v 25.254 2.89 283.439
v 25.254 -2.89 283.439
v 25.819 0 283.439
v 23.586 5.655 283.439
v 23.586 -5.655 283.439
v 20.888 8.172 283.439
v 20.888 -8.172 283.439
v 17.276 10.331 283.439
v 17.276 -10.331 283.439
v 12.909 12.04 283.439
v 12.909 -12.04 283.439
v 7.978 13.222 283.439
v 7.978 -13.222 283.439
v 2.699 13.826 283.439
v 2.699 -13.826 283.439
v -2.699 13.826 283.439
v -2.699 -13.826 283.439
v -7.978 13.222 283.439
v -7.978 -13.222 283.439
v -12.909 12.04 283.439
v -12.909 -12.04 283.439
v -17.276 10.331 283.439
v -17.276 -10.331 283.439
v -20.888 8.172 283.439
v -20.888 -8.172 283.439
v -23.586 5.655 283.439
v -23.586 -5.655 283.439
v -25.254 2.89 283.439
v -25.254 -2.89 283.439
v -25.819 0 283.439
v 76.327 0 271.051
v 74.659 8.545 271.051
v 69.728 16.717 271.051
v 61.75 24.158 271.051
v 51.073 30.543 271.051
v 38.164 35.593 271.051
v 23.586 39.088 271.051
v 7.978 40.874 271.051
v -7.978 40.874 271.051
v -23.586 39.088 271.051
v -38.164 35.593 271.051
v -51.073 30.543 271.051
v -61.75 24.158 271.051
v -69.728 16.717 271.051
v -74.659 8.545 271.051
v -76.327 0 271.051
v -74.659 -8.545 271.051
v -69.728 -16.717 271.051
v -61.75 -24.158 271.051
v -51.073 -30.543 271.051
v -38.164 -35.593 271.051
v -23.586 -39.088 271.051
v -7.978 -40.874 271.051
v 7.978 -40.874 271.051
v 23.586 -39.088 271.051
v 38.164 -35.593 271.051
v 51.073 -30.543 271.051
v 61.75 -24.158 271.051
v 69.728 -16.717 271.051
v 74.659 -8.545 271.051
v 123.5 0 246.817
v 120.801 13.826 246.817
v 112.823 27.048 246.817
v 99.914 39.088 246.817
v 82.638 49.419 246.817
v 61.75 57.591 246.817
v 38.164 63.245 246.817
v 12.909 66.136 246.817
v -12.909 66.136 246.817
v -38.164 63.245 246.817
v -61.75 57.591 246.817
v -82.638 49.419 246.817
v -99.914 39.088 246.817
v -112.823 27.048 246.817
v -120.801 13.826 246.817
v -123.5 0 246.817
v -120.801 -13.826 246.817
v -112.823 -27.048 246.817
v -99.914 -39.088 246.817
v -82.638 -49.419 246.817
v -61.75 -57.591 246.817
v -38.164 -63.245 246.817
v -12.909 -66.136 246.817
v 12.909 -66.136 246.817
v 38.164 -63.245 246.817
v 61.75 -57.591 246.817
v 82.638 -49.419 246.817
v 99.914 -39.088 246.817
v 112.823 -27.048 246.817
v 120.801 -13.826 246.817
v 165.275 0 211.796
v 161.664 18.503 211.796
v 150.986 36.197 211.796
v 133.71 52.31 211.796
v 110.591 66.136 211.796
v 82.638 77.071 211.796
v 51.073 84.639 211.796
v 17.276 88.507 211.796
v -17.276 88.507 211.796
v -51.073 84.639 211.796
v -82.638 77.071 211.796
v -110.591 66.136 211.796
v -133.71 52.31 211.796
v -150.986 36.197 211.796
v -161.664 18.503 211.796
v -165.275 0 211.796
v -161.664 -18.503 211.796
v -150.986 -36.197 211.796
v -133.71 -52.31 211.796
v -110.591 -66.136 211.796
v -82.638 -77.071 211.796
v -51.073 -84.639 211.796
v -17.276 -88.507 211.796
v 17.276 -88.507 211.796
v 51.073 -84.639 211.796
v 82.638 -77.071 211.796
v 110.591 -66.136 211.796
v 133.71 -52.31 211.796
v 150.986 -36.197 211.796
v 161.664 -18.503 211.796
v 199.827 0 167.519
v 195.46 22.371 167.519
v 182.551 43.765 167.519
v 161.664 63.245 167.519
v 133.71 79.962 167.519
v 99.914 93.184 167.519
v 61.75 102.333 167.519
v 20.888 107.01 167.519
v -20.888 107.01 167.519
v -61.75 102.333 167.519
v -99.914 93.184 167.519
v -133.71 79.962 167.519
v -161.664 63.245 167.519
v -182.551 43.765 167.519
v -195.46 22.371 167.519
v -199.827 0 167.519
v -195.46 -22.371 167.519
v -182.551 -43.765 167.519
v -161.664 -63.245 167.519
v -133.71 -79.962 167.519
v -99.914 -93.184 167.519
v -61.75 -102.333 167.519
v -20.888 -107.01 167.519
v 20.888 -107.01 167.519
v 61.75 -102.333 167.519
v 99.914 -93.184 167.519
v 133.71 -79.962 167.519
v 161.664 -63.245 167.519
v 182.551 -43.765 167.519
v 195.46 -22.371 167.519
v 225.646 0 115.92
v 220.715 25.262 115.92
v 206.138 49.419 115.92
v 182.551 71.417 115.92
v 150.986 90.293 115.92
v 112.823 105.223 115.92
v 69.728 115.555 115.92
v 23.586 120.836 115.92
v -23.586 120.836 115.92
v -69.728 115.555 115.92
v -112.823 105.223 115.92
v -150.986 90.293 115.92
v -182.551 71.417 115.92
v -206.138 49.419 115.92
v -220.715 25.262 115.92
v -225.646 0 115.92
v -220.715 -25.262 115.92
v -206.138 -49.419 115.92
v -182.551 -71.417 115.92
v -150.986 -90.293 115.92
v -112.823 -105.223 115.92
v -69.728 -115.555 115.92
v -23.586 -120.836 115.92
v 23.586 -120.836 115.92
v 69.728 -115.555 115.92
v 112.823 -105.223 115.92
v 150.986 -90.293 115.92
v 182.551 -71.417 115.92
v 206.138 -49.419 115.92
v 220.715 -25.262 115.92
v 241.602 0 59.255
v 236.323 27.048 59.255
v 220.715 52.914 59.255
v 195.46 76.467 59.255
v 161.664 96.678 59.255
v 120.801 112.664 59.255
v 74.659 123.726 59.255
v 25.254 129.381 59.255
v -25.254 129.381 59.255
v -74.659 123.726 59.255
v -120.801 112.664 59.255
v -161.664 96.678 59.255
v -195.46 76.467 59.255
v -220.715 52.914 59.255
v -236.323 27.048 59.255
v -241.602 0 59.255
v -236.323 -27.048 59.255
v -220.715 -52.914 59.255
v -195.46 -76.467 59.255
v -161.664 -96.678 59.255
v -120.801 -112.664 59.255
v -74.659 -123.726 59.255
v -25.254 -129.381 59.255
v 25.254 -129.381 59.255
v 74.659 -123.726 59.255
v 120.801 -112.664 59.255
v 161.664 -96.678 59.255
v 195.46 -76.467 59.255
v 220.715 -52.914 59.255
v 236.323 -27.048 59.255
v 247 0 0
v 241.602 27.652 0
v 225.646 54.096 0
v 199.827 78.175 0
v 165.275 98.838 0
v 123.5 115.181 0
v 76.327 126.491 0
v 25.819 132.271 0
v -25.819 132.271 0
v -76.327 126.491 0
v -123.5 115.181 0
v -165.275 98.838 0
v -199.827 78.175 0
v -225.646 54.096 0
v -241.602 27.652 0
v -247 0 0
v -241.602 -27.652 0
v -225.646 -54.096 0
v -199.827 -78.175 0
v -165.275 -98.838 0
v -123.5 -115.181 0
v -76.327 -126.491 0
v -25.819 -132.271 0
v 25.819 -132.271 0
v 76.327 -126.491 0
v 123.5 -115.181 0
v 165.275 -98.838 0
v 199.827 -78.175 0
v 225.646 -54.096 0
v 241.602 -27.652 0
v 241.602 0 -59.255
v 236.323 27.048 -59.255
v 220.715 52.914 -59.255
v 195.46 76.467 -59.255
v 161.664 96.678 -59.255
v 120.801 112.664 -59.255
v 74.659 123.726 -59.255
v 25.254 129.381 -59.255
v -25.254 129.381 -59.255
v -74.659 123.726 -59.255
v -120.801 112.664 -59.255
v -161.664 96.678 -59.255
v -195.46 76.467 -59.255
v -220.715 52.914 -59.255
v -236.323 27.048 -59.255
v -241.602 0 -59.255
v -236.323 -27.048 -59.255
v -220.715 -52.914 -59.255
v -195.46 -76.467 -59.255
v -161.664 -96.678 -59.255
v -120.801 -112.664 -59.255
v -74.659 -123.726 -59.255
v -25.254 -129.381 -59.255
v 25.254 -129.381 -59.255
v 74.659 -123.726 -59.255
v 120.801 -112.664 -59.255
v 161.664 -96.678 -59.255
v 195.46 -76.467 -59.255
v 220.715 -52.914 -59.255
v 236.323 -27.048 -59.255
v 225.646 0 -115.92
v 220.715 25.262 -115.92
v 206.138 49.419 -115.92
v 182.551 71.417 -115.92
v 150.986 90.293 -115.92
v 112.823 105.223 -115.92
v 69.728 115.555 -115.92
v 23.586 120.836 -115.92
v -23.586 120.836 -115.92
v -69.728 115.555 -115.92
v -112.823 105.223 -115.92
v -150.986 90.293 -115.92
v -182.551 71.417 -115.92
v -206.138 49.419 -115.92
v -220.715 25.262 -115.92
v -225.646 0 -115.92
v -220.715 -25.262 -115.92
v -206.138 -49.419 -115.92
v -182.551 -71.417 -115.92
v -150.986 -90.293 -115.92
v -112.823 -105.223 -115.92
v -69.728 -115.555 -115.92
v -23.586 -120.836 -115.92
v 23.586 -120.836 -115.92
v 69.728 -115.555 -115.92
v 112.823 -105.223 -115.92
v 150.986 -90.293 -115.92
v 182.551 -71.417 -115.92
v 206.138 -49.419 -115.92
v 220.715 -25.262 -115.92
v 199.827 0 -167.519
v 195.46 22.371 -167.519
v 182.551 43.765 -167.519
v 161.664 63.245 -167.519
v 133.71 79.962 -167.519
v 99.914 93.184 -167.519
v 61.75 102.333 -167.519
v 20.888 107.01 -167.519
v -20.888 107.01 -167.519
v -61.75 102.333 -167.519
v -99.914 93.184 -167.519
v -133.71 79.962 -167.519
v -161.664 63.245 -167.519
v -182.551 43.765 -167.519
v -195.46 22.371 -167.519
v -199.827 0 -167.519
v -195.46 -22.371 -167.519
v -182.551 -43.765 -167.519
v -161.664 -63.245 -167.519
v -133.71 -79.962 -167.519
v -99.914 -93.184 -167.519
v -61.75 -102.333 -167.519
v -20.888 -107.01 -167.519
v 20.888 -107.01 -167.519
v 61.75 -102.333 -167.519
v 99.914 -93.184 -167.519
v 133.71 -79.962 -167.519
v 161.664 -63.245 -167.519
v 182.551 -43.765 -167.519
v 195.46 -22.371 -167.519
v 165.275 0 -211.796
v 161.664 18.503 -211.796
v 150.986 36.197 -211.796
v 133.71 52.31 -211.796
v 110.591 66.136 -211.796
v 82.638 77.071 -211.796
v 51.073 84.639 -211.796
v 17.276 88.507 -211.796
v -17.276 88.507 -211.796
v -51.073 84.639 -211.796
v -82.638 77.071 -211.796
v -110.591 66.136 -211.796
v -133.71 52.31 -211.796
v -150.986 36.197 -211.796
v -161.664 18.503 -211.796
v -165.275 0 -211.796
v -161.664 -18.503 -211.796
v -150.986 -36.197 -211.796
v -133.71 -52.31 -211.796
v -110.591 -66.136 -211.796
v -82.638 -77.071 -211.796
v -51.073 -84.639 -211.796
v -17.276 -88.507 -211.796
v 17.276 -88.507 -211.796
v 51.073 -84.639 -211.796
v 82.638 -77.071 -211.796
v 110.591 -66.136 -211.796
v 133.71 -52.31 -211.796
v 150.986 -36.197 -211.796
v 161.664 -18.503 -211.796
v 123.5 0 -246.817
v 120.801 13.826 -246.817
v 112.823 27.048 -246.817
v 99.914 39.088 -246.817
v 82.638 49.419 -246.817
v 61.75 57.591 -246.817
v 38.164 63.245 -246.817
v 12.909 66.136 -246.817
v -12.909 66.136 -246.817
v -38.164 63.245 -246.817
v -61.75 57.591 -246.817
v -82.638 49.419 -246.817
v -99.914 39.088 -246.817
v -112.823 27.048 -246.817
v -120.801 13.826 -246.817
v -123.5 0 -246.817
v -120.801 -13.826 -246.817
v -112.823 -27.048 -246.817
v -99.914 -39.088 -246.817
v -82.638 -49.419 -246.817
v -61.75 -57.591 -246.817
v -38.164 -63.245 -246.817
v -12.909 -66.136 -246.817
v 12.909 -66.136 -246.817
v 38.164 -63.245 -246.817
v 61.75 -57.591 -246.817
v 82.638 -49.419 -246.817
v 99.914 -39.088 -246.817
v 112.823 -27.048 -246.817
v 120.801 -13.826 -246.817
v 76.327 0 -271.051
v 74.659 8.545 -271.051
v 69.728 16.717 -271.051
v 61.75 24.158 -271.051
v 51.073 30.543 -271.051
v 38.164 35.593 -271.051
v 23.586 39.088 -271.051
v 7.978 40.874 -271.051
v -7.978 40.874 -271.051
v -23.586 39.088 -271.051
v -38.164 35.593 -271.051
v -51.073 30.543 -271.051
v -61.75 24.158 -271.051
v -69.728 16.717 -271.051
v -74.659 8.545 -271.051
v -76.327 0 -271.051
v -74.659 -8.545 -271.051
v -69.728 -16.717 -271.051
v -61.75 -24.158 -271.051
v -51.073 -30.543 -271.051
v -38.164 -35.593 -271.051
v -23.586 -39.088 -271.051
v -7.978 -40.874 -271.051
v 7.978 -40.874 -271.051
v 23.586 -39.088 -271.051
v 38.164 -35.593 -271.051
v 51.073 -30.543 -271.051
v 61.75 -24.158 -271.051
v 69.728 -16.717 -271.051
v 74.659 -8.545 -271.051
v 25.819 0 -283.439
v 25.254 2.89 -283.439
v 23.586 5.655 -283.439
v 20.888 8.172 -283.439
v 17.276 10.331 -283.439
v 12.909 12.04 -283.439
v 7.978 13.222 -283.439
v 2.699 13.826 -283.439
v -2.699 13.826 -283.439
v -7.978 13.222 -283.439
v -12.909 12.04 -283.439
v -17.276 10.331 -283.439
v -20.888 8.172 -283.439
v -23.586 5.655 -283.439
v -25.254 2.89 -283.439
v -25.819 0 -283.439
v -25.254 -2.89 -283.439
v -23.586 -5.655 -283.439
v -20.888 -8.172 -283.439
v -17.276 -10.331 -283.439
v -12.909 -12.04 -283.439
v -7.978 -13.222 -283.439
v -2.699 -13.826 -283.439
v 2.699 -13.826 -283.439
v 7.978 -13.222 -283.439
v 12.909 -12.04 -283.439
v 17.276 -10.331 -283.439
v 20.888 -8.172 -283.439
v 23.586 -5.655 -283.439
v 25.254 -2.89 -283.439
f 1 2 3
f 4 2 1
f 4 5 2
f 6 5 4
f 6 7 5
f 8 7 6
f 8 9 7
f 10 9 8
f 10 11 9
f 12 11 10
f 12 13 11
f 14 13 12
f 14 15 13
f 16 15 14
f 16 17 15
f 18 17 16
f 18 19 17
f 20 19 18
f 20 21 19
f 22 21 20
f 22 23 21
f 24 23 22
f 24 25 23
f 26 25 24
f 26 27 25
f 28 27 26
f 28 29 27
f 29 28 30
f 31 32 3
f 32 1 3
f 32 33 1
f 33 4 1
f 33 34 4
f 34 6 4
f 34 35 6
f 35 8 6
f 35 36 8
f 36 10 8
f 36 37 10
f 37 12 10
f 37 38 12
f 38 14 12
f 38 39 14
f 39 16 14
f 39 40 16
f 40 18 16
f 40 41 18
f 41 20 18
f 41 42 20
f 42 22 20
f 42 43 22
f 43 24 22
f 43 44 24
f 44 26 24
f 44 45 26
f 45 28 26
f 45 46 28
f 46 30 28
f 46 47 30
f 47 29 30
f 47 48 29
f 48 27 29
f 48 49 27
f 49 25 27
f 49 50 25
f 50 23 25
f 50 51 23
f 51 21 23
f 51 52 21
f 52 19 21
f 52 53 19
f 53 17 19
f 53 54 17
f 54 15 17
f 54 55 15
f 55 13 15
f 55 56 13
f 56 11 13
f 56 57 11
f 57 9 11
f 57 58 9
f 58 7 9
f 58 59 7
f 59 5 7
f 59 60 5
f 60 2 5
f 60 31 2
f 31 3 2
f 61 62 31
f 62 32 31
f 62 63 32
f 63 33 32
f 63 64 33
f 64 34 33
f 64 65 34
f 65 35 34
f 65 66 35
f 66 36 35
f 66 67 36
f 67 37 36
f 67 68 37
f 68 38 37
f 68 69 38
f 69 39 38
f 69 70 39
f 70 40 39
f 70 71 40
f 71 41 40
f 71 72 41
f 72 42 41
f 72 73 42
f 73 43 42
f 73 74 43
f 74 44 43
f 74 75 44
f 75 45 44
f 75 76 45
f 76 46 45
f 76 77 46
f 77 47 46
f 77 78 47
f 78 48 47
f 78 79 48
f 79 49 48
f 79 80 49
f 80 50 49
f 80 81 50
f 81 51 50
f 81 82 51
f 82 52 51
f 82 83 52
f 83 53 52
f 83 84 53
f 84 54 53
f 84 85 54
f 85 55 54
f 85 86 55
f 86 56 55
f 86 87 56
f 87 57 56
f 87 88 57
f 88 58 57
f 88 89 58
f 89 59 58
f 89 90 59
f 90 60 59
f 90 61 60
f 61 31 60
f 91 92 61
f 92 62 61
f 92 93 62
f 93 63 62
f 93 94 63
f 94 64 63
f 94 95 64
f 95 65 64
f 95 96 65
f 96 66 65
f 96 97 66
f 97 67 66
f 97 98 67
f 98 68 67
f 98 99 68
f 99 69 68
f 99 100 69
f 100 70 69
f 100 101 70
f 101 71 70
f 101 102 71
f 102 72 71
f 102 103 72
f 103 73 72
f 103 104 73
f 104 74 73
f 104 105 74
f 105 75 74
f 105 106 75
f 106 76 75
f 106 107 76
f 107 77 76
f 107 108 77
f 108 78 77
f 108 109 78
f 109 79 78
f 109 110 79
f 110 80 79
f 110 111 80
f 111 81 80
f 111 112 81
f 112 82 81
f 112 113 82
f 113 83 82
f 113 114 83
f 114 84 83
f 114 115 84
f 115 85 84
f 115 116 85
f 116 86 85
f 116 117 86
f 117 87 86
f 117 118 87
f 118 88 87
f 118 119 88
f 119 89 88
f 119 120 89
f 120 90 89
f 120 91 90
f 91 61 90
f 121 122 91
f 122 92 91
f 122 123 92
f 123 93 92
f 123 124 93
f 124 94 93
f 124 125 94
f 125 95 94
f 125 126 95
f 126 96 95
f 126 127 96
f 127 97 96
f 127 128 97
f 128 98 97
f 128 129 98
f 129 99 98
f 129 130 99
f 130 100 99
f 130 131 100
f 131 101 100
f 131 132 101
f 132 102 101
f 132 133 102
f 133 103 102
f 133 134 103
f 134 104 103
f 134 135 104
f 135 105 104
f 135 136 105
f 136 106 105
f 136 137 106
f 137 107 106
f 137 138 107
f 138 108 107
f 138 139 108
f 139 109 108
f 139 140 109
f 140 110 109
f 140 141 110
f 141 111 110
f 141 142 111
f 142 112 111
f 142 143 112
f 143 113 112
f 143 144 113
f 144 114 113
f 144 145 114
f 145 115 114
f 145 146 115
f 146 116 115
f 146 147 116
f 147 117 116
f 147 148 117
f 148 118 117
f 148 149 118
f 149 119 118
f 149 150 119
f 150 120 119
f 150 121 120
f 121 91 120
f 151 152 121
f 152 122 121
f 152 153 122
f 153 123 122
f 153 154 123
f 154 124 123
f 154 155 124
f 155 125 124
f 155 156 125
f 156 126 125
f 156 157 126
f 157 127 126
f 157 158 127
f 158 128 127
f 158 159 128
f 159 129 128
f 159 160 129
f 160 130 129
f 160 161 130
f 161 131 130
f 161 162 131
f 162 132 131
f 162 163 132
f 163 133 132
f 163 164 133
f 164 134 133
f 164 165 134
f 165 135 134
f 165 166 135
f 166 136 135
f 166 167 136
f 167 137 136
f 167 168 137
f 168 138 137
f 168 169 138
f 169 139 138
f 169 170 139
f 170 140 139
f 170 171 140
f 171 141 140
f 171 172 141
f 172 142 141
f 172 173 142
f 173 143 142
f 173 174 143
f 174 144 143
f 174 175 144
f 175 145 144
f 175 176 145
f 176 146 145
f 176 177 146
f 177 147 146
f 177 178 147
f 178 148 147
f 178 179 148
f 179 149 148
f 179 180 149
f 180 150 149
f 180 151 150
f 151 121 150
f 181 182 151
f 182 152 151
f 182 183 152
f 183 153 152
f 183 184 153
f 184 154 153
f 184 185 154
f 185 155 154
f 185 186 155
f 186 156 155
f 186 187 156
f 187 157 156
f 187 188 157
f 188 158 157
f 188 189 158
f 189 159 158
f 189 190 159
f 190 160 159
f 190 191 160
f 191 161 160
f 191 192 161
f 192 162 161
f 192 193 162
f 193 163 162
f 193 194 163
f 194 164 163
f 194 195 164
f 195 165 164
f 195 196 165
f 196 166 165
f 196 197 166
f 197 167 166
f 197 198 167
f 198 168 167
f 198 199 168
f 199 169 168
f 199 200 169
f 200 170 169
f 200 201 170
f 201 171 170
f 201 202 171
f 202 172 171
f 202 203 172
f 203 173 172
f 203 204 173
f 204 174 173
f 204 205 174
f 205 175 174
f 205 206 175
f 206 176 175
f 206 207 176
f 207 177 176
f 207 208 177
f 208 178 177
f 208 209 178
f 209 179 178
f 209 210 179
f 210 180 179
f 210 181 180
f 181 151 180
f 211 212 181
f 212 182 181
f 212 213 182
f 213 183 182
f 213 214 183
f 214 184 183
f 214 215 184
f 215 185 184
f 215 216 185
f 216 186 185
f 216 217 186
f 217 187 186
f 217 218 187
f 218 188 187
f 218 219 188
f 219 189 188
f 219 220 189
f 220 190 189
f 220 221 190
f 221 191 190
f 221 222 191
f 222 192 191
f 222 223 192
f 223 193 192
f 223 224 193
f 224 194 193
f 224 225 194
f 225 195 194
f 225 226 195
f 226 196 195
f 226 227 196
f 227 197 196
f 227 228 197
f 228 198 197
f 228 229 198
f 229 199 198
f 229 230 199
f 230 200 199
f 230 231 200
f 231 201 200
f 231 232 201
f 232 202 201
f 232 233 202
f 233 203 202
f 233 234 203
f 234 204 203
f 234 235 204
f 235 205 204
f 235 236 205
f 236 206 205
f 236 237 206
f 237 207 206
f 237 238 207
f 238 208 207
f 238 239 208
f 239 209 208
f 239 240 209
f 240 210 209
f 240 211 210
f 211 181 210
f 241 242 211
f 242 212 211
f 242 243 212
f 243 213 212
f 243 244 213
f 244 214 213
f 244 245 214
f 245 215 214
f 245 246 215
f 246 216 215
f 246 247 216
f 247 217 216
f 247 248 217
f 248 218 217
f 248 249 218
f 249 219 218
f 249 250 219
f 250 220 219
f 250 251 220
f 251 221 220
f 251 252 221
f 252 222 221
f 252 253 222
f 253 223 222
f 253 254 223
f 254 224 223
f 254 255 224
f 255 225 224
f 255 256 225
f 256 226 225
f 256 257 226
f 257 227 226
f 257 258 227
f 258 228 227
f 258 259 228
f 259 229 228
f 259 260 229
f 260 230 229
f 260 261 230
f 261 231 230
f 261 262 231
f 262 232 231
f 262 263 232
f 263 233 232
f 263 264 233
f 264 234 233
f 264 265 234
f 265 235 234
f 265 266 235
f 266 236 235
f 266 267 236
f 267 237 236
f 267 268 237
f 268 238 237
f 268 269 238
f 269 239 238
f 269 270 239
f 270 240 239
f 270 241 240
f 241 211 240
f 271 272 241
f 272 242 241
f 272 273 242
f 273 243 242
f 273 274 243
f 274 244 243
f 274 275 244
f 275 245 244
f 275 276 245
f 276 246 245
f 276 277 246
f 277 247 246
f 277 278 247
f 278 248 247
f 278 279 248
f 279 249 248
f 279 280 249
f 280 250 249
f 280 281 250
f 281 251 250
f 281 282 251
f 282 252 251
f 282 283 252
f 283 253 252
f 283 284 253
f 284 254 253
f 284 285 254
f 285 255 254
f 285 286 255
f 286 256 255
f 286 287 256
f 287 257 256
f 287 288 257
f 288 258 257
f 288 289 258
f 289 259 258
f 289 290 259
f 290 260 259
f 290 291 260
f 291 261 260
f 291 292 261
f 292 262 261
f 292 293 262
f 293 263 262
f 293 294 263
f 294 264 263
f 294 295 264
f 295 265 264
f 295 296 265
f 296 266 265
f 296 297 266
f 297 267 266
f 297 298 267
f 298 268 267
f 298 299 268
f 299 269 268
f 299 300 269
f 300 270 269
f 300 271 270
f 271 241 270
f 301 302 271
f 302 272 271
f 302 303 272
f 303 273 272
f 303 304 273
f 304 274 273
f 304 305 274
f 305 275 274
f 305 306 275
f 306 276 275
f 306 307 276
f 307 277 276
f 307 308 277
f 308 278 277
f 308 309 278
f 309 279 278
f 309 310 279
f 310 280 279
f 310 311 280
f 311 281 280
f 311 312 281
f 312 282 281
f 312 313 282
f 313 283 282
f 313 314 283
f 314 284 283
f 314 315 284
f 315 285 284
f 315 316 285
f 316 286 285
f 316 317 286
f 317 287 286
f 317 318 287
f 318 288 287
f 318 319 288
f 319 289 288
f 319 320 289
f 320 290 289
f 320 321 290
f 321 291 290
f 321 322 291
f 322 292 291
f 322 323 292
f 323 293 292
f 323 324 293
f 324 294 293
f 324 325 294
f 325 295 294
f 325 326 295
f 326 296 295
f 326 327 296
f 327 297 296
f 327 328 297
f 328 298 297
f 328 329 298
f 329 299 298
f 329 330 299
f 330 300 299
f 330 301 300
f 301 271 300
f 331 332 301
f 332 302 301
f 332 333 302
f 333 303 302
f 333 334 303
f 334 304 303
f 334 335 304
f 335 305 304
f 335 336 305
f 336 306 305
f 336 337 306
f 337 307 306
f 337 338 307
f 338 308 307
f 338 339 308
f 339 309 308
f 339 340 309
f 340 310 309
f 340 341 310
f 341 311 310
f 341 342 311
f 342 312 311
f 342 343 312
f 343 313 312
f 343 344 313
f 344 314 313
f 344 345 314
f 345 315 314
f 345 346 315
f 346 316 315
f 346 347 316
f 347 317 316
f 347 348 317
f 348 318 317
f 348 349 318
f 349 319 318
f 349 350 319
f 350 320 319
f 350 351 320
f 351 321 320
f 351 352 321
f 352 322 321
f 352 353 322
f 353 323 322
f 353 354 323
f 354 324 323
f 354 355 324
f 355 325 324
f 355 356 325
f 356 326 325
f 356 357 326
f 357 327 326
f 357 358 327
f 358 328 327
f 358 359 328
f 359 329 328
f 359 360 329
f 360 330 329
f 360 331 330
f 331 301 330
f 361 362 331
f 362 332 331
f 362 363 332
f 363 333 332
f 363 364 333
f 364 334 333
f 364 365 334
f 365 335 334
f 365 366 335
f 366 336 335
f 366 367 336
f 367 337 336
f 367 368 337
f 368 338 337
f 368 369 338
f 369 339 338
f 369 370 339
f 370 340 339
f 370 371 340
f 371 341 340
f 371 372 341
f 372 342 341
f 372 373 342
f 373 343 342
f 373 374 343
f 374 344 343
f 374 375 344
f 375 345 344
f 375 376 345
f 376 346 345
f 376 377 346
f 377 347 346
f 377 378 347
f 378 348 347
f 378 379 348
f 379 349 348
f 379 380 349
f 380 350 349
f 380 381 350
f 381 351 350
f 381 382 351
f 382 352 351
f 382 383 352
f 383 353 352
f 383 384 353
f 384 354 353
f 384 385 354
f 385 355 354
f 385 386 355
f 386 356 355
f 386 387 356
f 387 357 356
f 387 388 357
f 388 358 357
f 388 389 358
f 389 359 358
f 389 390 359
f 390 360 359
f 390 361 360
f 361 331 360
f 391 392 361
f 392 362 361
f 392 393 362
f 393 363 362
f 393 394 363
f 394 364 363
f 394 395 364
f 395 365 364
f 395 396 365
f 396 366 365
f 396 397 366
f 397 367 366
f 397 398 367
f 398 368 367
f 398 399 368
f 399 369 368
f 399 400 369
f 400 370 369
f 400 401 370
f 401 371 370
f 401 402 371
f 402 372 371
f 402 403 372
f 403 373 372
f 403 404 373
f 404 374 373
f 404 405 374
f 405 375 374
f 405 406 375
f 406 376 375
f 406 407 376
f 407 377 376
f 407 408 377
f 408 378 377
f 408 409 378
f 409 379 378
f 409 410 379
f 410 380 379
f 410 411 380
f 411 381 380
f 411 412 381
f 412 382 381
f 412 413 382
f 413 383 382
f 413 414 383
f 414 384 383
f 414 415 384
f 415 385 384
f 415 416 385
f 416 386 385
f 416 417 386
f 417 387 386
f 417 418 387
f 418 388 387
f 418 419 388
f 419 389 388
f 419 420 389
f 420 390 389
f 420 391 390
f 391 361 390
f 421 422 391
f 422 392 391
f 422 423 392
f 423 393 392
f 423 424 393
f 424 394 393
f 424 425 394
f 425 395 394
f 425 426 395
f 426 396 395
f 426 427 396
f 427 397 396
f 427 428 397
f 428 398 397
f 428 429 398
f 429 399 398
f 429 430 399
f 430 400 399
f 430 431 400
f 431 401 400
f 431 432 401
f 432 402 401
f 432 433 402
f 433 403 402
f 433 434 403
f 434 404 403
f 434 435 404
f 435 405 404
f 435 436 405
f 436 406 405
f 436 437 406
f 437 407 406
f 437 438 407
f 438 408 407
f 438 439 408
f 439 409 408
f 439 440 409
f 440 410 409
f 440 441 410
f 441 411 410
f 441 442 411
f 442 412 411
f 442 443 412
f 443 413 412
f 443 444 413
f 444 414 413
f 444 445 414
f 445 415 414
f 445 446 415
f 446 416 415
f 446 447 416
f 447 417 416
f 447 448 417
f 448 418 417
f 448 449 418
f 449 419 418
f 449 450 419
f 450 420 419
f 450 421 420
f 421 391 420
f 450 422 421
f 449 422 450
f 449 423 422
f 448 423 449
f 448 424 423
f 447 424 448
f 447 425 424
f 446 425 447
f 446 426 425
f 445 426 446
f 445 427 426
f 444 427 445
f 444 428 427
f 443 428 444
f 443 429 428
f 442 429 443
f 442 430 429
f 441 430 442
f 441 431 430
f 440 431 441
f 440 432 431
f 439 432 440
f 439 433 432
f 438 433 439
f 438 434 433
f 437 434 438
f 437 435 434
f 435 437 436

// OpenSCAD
// Generated by SolidPython 1.0.1 on 2020-07-29 00:46:50


scale(v = [13, 7, 15]) {
	sphere(r = 19);
}
/***********************************************
*********      SolidPython code:      **********
************************************************
 
# import packages: SolidPython
from solid import *
from solid.utils import *
from itertools import chain, combinations, permutations


class Resize:

    def __init__(self, scad_file):
        self.scad_file = scad_file
        #self.scad_file = import_scad(scad_file)
        # cone/cylinder param:
        self.r1 = 0
        self.r2 = 0
        self.h = 0
        # rectangular prism param:
        self.w = 0
        self.l = 0
        # ellipse param:
        self.r = 0

    # import OpenScad code (file name corresponds to shape)


    # classify shape + parameters
    def assign(self, param1, param2, param3):
        if self.scad_file == 'cone.scad':
            self.r1 = param1
            self.r2 = param2
            self.h = param3
        elif self.scad_file == 'cylinder.scad':
            self.r1 = param1
            self.r2 = param2
            self.h = param3
        elif self.scad_file == 'rectangularPrism.scad':
            self.h = param1
            self.l = param2
            self.w = param3
        else:
            self.r = param1
            self.h = param2

    # resize parameters
    def iterate(self):
        x = range(3, 20, 2)
        i = 1
        if self.scad_file == 'cone.scad':
            tempList = list(permutations(x, 2))
            for temp in tempList:
                param1 = temp[0]
                param2 = temp[1]
                filepath = 'produced_scad_files/' + 'cone' + str(param1) + '_' + str(param2) + '_' + '.scad'
                scad_render_to_file(cylinder(h=param1, r1=param2, r2=0), filepath)

        elif self.scad_file == 'cylinder.scad':
            tempList = list(permutations(x, 3))
            for temp in tempList:
                param1 = temp[0]
                param2 = temp[1]
                filepath = 'produced_scad_files/' + 'cylinder' + str(param1) + '_' + str(param2) + '_' + '.scad'
                scad_render_to_file(cylinder(h=param1, r1=param2, r2=param2), filepath)

        elif self.scad_file == 'rectangularPrism.scad':
            tempList = list(permutations(x, 3))
            for temp in tempList:
                param1 = temp[0]
                param2 = temp[1]
                param3 = temp[2]
                filepath = 'produced_scad_files/' + 'rectangularPrism' + str(param1) + '_' + str(param2) + '_' + str(
                    param3) + '.scad'
                scad_render_to_file(cube(size=(param1, param2, param3)), filepath)

        elif self.scad_file == 'ellipse.scad':
            tempList = list(permutations(x, 4))
            for temp in tempList:
                param1 = temp[0]
                param2 = temp[1]
                param3 = temp[2]
                param4 = temp[3]
                filepath = 'produced_scad_files/' + 'ellipse' + str(param1) + '_' + str(param2) + '_' + str(param3) + '_' + str(param4) + '.scad'
                scad_render_to_file(scale([param1, param2, param3])(sphere(r=param4)), filepath)

    def render_to_scadfile(self):
        scad_render_to_file(scad, 'example.scad') 
 
************************************************/
